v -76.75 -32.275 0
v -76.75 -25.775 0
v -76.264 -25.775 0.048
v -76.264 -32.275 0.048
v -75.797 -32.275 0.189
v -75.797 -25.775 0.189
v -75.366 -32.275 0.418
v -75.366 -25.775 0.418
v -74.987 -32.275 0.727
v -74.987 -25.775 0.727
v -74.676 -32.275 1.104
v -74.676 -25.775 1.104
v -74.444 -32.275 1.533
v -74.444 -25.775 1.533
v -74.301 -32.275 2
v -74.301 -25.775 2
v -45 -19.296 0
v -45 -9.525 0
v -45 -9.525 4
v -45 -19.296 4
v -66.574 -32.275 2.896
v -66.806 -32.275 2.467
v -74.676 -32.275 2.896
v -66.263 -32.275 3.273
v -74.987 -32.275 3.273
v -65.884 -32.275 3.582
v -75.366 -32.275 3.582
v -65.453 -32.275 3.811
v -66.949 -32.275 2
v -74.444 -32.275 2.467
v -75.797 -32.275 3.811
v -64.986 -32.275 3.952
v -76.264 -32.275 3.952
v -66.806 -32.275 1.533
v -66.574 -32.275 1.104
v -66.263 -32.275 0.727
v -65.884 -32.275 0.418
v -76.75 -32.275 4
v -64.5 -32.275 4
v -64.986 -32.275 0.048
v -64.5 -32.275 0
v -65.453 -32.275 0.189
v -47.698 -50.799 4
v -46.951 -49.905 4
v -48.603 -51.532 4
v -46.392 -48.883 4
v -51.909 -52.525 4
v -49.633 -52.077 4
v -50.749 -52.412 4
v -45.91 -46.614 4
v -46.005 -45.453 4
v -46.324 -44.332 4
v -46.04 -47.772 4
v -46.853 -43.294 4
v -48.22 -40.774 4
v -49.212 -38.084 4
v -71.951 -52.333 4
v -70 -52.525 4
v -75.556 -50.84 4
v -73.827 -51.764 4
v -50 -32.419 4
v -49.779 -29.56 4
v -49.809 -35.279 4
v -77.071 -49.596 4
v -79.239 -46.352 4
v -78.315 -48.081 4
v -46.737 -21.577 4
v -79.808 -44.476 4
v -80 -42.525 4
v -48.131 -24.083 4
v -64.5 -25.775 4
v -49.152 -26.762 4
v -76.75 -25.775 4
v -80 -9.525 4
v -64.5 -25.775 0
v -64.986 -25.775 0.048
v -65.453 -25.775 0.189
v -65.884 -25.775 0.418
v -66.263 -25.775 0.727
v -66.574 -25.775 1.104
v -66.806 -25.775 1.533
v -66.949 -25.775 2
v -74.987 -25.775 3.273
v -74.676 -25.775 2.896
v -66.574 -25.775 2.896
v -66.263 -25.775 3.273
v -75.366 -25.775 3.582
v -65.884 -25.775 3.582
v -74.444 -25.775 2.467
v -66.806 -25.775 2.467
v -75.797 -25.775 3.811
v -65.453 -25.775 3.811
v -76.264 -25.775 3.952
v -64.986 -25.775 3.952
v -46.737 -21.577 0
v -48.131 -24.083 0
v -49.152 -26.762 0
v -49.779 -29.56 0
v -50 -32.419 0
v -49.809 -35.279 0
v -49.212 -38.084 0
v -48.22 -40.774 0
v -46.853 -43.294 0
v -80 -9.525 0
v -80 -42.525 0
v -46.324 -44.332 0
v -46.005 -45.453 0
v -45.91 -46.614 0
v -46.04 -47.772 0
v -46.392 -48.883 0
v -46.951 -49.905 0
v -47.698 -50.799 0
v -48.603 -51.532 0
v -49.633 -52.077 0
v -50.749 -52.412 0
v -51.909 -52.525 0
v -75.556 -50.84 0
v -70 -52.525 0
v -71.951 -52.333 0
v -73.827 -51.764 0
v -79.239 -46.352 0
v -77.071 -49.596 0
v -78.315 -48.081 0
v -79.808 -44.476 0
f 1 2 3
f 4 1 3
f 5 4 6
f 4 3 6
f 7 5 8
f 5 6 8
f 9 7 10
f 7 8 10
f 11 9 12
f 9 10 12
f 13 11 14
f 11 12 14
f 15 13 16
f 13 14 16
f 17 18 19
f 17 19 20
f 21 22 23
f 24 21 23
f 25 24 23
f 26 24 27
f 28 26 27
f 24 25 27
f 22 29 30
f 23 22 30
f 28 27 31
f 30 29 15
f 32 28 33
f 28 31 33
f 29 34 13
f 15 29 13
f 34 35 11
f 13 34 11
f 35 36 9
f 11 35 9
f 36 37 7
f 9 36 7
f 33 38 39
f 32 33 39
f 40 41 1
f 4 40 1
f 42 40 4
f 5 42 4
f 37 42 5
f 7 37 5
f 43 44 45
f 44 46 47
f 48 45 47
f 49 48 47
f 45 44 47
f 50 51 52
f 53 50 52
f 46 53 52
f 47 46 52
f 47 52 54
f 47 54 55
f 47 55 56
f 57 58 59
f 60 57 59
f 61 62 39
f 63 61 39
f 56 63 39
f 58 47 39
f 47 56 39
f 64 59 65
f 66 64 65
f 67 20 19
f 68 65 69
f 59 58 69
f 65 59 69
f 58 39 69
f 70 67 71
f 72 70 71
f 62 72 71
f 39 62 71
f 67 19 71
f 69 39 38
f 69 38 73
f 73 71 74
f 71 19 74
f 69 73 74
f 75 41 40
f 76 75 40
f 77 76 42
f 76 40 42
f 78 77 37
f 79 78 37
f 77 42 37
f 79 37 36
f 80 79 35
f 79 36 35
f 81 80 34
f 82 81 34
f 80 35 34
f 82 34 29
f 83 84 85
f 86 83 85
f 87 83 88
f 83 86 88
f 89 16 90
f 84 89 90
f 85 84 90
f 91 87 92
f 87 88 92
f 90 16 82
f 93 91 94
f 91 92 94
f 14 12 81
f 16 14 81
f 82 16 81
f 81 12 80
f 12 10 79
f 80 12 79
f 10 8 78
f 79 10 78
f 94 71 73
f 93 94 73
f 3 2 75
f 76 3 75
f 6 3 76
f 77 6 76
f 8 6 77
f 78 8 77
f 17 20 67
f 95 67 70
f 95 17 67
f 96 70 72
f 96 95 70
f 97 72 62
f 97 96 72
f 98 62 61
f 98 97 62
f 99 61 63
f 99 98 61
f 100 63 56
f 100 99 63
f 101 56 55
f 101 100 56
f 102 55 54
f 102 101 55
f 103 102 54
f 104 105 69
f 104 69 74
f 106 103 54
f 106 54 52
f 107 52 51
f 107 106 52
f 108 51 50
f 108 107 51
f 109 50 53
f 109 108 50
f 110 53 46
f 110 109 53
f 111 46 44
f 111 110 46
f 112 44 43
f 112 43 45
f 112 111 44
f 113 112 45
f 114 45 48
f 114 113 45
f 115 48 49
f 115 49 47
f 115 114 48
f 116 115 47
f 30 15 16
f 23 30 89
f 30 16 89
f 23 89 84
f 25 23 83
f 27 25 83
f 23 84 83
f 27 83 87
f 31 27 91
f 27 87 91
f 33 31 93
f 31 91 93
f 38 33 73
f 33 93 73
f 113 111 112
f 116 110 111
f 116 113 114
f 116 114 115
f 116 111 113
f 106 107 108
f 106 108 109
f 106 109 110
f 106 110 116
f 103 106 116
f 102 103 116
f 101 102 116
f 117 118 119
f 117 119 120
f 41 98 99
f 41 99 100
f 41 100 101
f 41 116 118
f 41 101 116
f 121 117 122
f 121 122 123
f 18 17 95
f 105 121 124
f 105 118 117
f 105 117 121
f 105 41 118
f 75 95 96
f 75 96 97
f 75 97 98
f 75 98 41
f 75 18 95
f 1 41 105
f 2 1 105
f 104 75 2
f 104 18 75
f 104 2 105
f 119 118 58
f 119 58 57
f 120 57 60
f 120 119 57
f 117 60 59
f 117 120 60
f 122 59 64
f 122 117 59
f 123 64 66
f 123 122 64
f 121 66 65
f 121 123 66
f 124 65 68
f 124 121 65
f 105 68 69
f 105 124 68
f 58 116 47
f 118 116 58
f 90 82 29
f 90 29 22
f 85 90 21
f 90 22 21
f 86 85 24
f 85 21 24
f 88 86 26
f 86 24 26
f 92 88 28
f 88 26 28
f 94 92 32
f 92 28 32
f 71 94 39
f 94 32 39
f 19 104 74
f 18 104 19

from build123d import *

# Parameters (mm, degrees)
BOSS_EXTRU_1_DEPTH      = 4
ESQUISSE2_W             = 7.25
ESQUISSE2_H             = 6.5
ENL_V_MAT_EXTRU_1_DEPTH = 96.785571069
CONG_1_R                = 2.5
CUT_EXTRUDE1_REACH      = 97.786


with BuildPart() as part:
    # Esquisse1 → Boss.-Extru.1 (new body)
    with BuildSketch(Plane.XY):
        with BuildLine():
            Line((-34.444097209, -52.025), (-34.444097209, -52.525))
            Line((-34.444097209, -52.525), (-70, -52.525))
            ThreePointArc((-70, -52.525), (-77.071067812, -49.596067812), (-80, -42.525))
            Line((-80, -42.525), (-80, -9.525))
            Line((-80, -9.525), (-45, -9.525))
            Line((-45, -9.525), (-45, -19.296243445))
            ThreePointArc((-45, -19.296243445), (-49.034471505, -38.664128156), (-34.444097209, -52.025))
        make_face()
    extrude(amount=BOSS_EXTRU_1_DEPTH)

    # Esquisse2 → Enlèv. mat.-Extru.1 (cut, through all)
    with BuildSketch(Plane(origin=(0, 0, 0), x_dir=(-1, 0, 0), z_dir=(0, 0, -1))):
        with Locations((70.625, -29.025)):
            Rectangle(ESQUISSE2_W, ESQUISSE2_H)
    extrude(amount=-ENL_V_MAT_EXTRU_1_DEPTH, mode=Mode.SUBTRACT)

    # Congé1
    # the kernel refuses this fillet: 2.5 mm, written as the material it takes off along each edge
    with BuildSketch(Plane(origin=(-74.25, -25.775, 4), x_dir=(-1, 0, 0), z_dir=(0, -1, 0)), Plane(origin=(-67, -32.275, 4), x_dir=(1, 0, 0), z_dir=(0, 1, 0))) as cong_1_piece_1:
        with BuildLine():
            CenterArc((CONG_1_R, CONG_1_R), CONG_1_R, 180, 90)
            Line((0, CONG_1_R), (0, 0))
            Line((0, 0), (CONG_1_R, 0))
        make_face()
    extrude(amount=6.5, mode=Mode.SUBTRACT)
    with BuildSketch(Plane(origin=(-74.25, -25.775, 0), x_dir=(-1, 0, 0), z_dir=(0, -1, 0)), Plane(origin=(-67, -32.275, 0), x_dir=(1, 0, 0), z_dir=(0, 1, 0))) as cong_1_piece_2:
        with BuildLine():
            CenterArc((CONG_1_R, -CONG_1_R), CONG_1_R, 90, 90)
            Line((0, -CONG_1_R), (0, 0))
            Line((0, 0), (CONG_1_R, 0))
        make_face()
    extrude(amount=6.5, mode=Mode.SUBTRACT)

    # Sketch1 → Cut-Extrude1 (cut, up to next)
    with BuildSketch(Plane(origin=(0, 0, 0), x_dir=(-1, 0, 0), z_dir=(0, 0, -1)), mode=Mode.PRIVATE) as cut_extrude1_sk1:
        with BuildLine():
            Line((51.9089023, -52.525), (34.444097209, -52.525))
            Line((34.444097209, -52.525), (34.444097209, -52.025))
            Line((34.444097209, -52.025), (46.853001769, -43.294230769))
            ThreePointArc((46.853001769, -43.294230769), (46.646554184, -49.407306768), (51.9089023, -52.525))
        make_face()
    cut_extrude1_tool1 = extrude(cut_extrude1_sk1.sketch, amount=-CUT_EXTRUDE1_REACH, mode=Mode.PRIVATE) & part.part
    add(cut_extrude1_tool1.solids().sort_by_distance((-42.611695, -49.79665, 0))[0], mode=Mode.SUBTRACT)


solid = part.part
